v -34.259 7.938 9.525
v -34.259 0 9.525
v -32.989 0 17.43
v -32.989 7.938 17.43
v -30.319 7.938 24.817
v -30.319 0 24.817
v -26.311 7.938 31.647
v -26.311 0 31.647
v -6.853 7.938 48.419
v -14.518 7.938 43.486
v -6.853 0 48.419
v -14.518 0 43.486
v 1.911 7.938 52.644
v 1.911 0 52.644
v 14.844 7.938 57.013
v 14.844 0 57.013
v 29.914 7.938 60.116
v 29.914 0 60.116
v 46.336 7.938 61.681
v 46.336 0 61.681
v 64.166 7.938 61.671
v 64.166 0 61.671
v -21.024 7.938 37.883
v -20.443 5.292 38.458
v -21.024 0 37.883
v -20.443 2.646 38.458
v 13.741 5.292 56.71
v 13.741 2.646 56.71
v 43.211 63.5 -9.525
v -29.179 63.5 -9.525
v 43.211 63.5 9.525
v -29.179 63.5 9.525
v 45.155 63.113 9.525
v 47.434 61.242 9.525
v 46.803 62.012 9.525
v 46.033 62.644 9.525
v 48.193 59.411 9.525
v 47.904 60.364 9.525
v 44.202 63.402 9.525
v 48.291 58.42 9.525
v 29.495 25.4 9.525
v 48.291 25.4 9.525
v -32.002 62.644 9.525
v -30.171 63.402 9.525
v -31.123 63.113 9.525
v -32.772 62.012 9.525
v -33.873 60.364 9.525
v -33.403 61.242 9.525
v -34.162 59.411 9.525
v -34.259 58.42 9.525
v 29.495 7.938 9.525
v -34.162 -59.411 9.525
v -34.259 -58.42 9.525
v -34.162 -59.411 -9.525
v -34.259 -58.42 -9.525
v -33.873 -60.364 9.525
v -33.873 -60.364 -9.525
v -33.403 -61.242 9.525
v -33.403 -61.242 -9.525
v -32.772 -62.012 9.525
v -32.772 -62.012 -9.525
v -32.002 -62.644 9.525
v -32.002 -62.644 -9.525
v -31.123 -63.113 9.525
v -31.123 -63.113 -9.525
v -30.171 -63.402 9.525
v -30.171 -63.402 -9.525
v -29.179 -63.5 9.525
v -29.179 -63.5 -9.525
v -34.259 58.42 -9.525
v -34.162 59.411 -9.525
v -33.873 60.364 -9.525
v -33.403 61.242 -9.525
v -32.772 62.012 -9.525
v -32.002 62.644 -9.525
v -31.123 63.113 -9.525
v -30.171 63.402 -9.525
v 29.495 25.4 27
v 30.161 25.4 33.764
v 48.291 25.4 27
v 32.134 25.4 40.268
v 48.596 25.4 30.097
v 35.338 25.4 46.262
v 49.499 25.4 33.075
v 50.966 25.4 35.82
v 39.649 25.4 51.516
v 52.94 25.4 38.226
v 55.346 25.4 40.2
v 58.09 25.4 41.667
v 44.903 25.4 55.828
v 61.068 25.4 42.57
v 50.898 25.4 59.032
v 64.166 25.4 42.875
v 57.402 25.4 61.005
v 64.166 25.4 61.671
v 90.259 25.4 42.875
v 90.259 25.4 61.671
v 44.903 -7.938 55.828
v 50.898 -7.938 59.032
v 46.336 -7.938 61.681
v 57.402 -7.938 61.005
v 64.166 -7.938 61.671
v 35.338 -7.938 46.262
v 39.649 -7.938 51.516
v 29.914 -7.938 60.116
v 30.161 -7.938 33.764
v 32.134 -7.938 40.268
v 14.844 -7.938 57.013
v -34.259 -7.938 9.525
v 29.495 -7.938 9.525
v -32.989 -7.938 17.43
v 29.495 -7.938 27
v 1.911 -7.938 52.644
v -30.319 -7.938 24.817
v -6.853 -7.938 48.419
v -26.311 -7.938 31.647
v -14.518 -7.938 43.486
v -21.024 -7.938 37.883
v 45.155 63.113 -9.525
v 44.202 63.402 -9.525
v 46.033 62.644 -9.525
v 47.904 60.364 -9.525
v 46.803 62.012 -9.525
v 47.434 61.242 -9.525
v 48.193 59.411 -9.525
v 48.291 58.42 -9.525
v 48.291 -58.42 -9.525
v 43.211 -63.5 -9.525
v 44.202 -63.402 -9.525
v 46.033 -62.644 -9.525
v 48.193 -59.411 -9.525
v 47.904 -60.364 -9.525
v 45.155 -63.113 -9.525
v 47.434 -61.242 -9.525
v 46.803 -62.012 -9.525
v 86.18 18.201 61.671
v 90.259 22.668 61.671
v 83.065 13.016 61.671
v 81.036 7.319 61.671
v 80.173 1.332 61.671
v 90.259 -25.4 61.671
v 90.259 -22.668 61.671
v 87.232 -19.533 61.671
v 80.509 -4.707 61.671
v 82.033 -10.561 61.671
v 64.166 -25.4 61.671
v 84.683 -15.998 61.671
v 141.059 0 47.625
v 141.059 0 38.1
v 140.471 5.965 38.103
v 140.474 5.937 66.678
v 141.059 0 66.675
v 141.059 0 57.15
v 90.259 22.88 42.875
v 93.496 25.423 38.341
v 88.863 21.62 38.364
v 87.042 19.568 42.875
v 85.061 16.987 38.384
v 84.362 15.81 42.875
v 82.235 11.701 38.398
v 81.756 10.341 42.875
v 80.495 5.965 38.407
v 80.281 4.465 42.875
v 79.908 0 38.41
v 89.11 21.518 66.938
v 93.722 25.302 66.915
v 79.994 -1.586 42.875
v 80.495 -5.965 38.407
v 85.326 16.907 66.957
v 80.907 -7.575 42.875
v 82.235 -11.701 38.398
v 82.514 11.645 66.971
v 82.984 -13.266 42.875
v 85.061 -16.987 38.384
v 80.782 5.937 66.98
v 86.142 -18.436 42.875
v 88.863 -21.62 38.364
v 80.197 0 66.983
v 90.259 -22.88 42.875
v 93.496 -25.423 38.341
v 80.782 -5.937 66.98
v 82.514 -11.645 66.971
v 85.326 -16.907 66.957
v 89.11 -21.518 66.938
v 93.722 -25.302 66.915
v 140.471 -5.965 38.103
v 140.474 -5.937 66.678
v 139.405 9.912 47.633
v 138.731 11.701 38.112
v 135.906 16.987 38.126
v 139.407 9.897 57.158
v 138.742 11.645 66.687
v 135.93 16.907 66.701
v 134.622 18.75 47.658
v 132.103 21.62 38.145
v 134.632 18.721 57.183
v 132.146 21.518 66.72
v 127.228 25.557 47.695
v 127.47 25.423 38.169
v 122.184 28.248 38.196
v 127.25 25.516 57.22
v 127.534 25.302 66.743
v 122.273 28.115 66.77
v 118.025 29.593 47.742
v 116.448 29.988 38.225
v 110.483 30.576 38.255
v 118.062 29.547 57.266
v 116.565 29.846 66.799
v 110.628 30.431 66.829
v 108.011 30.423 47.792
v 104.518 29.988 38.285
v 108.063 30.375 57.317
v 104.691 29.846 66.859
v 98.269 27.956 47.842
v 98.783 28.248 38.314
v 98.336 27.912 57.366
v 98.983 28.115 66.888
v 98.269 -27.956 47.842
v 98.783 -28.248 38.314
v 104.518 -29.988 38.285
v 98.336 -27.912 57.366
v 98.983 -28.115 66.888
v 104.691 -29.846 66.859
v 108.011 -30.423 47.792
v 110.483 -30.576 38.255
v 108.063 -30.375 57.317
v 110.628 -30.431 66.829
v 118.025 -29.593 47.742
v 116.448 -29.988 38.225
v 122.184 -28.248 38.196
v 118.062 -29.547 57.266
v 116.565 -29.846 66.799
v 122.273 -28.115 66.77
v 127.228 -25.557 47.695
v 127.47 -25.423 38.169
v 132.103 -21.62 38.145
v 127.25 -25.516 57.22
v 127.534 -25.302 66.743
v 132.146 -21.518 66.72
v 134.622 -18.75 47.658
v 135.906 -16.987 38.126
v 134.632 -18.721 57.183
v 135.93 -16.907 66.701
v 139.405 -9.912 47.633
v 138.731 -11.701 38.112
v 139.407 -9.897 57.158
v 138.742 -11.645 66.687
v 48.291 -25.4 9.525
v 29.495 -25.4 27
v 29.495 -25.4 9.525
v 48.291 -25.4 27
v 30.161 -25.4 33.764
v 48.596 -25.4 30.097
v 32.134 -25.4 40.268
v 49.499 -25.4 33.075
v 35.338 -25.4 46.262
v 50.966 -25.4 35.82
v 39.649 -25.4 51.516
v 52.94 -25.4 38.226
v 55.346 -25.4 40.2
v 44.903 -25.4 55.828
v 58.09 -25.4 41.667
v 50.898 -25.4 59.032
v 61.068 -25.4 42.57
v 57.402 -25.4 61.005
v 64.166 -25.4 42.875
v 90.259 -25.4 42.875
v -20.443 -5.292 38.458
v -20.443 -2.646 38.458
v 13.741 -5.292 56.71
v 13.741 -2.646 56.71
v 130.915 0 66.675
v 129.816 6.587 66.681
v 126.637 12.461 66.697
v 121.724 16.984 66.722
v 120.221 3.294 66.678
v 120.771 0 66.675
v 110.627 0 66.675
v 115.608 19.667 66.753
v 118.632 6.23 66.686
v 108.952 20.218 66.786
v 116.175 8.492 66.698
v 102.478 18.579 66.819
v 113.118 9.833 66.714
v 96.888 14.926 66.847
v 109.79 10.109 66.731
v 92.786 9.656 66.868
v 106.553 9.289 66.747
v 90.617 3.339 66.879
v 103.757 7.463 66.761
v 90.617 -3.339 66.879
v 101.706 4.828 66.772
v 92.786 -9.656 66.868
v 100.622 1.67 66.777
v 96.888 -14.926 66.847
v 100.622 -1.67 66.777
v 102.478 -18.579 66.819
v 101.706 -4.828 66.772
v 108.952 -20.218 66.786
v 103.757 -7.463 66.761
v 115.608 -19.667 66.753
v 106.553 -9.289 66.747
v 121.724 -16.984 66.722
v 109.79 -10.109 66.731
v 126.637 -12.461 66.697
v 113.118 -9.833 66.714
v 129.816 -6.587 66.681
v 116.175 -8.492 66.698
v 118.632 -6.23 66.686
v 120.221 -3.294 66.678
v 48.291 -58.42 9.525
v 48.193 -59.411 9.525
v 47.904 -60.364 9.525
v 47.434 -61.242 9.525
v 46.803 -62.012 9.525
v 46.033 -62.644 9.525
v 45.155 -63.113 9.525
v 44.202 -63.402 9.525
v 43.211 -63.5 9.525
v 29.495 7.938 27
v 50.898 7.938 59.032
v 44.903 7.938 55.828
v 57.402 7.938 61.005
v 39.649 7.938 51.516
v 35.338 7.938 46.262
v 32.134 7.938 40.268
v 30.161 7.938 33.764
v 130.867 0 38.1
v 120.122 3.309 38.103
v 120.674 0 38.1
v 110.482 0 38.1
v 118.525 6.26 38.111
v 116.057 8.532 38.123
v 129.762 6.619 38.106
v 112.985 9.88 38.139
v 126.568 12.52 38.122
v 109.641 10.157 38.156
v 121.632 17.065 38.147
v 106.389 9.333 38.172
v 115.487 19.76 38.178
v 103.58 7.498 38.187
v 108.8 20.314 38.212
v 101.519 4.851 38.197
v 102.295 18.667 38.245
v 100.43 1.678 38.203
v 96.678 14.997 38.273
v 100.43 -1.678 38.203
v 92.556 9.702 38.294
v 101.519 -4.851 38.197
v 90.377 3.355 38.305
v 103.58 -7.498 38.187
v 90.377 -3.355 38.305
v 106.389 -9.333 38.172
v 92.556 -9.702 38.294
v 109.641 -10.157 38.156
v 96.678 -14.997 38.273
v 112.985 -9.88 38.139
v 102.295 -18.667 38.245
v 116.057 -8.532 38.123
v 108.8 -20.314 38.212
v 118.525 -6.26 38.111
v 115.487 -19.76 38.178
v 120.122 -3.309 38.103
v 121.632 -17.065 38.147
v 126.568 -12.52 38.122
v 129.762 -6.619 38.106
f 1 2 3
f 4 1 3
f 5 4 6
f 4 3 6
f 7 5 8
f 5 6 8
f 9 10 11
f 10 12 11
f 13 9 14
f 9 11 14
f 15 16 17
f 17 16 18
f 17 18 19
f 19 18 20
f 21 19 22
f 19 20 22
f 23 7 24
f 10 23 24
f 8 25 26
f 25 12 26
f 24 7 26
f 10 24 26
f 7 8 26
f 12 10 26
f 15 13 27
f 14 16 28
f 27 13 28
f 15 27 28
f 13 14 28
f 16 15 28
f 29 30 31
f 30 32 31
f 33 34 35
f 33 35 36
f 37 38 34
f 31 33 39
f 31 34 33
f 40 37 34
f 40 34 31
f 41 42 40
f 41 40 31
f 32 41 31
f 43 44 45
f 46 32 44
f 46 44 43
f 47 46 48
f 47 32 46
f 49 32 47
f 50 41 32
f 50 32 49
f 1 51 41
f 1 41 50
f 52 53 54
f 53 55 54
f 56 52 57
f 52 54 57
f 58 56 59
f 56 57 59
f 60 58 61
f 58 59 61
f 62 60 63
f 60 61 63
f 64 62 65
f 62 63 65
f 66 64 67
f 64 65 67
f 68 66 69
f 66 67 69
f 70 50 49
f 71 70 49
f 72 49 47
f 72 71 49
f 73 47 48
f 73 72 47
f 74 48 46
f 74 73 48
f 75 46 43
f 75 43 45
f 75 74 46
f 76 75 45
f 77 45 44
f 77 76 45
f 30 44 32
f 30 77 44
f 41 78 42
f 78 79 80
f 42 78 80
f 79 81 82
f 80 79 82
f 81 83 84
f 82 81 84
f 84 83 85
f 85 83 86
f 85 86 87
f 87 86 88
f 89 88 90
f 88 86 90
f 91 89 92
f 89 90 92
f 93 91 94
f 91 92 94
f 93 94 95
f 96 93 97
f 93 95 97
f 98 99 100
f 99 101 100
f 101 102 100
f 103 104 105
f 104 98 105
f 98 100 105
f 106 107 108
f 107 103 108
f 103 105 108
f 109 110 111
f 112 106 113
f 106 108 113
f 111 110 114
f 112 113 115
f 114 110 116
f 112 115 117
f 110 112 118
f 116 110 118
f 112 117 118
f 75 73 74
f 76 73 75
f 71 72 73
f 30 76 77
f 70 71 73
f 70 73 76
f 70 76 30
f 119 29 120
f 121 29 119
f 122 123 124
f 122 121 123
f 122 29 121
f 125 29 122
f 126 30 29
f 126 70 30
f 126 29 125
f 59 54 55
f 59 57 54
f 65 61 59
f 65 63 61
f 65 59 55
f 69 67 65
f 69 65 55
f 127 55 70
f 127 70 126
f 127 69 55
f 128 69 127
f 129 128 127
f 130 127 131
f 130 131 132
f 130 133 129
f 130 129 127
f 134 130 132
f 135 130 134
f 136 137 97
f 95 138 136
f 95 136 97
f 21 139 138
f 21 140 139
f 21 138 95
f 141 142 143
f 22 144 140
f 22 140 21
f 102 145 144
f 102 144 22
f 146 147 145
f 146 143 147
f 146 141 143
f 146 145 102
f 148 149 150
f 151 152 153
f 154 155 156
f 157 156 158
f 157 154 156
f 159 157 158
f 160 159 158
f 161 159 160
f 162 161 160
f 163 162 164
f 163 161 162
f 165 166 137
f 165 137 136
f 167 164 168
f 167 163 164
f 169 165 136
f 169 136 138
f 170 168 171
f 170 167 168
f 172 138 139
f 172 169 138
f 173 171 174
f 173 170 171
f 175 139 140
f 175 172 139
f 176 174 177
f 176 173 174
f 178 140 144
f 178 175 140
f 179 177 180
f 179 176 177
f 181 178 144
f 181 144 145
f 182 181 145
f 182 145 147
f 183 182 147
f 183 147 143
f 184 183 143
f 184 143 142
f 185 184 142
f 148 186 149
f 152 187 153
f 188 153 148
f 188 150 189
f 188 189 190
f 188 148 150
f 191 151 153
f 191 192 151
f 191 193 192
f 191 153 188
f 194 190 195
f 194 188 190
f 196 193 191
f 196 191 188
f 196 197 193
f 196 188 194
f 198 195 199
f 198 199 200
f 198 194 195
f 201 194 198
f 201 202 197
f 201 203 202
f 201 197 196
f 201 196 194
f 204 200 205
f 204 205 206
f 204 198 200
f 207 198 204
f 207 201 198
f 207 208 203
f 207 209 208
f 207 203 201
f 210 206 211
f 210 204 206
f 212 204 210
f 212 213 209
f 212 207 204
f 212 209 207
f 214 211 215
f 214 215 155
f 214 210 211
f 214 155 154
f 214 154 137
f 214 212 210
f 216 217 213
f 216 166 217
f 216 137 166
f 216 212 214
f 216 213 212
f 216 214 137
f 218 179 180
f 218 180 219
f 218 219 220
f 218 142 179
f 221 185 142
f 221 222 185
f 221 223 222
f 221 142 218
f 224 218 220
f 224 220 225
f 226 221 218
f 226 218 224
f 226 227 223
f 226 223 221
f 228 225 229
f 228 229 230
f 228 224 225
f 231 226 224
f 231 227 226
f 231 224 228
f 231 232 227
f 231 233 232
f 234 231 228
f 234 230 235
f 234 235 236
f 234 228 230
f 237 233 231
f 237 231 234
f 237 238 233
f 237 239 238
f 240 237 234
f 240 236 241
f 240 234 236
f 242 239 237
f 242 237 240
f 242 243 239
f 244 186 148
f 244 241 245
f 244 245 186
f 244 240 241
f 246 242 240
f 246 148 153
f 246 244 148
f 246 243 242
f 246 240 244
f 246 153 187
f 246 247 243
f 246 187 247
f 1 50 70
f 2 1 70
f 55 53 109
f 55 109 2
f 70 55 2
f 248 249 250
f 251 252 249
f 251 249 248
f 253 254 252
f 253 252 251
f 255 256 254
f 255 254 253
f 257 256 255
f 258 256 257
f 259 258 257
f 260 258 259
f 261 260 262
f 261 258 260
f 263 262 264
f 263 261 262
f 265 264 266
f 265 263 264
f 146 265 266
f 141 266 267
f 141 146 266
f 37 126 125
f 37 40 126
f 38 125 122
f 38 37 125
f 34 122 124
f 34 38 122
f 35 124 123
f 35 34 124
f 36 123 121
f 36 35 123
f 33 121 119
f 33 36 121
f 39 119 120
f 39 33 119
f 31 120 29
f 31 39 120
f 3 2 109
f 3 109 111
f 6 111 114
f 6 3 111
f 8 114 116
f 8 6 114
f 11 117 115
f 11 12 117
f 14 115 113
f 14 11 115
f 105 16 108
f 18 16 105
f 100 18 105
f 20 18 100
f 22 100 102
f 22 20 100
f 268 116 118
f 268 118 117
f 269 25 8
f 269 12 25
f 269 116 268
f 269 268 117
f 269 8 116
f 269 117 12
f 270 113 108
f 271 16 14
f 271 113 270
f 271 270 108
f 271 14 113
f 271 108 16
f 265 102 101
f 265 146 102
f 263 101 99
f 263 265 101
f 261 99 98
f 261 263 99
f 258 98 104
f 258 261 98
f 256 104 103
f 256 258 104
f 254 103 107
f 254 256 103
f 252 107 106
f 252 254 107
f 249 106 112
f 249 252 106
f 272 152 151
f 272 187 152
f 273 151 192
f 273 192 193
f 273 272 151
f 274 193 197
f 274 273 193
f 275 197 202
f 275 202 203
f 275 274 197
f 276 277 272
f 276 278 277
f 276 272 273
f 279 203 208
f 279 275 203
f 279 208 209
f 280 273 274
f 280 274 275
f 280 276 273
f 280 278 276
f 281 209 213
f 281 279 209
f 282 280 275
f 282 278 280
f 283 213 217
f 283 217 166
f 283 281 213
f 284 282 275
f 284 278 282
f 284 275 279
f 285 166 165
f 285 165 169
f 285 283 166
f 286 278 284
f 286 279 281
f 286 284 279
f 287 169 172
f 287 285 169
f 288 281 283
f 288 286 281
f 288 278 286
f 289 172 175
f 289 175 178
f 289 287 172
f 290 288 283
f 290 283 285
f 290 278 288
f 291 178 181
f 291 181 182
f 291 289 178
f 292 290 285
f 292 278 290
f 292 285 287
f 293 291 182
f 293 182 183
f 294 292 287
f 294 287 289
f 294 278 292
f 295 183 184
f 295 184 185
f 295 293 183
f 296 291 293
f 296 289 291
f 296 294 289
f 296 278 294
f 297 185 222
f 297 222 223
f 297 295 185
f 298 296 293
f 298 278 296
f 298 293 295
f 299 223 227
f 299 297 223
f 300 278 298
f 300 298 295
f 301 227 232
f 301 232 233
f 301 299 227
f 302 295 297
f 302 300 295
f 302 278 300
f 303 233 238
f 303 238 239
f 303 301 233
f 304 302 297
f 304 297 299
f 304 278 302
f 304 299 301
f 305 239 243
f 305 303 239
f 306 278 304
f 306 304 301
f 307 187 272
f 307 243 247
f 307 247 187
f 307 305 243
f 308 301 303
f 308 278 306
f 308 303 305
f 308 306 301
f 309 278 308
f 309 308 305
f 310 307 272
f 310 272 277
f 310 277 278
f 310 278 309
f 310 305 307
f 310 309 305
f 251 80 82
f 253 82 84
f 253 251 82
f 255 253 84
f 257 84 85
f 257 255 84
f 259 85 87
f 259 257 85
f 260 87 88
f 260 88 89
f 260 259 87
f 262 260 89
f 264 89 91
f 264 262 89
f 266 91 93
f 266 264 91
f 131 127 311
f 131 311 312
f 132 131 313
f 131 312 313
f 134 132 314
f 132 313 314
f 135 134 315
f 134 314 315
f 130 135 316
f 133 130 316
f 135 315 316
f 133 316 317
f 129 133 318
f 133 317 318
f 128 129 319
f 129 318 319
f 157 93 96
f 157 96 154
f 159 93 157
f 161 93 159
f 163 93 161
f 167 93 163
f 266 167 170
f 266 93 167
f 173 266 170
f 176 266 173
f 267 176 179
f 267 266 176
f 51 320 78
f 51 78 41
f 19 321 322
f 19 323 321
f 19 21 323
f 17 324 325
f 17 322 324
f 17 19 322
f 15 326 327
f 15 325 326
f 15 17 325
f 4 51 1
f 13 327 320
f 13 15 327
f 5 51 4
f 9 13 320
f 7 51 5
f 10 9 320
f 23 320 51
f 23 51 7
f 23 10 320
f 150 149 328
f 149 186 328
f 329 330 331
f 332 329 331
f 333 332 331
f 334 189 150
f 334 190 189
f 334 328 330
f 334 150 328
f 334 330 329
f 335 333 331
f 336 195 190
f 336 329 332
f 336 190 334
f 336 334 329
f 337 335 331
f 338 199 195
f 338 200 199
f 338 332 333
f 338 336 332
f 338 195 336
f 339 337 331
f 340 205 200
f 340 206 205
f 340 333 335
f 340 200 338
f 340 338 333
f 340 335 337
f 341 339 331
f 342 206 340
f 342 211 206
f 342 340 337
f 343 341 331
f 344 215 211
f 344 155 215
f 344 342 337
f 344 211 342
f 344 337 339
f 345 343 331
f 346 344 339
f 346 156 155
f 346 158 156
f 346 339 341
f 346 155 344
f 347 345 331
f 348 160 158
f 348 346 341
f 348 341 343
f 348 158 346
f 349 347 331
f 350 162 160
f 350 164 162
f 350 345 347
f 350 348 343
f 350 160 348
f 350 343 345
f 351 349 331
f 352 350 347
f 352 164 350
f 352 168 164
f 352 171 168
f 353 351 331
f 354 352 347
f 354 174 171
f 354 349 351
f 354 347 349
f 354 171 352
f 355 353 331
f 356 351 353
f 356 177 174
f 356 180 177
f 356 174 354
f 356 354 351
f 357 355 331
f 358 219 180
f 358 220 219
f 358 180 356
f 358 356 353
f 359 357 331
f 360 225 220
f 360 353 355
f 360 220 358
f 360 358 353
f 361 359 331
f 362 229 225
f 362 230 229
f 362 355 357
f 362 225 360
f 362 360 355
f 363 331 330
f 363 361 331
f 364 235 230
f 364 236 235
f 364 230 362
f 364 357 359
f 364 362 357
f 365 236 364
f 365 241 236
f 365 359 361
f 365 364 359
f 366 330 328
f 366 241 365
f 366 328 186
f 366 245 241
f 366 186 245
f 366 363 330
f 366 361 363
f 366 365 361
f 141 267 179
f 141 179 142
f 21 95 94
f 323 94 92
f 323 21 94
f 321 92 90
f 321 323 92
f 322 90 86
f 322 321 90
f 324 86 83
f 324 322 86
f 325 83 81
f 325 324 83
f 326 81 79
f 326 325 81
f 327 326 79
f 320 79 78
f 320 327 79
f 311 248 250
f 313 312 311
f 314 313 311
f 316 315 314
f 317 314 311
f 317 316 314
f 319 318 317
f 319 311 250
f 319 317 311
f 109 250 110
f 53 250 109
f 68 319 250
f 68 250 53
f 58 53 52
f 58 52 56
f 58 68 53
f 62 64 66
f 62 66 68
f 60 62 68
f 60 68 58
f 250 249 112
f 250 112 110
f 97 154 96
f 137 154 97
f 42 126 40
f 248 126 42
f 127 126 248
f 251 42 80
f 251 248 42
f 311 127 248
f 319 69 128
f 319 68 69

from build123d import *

# Parameters (mm, degrees)
F1_DEPTH = 63.5
F2_DEPTH = 25.4
F3_DEPTH = 7.9375
F5_R     = 5.08


with BuildPart() as f1:
    # F0 (on Front) → F1 (new body, symmetric)
    with BuildSketch(Plane.XZ):
        Polygon((29.4945527817, 9.525), (-34.2594462869, 9.525), (-34.2594462869, -9.525), (48.2905537131, -9.525), (48.2905537131, 9.525), align=None)
    extrude(amount=F1_DEPTH, both=True)

    # F0 (on Front) → F2 (join, symmetric)
    with BuildSketch(Plane.XZ):
        with BuildLine():
            Line((29.4945527817, 27.0002), (29.4945527817, 9.525))
            Line((29.4945527817, 9.525), (48.2905537131, 9.525))
            Line((48.2905537131, 9.525), (48.2905537131, 27.0002))
            ThreePointArc((48.2905537131, 27.0002), (52.9402335618, 38.2255201513), (64.1655537131, 42.8752))
            Line((64.1655537131, 42.8752), (90.2585908771, 42.8752))
            Line((90.2585908771, 42.8752), (90.2585908771, 61.6712009314))
            Line((90.2585908771, 61.6712009314), (64.1655537131, 61.6712009314))
            ThreePointArc((64.1655537131, 61.6712009314), (39.649453844, 51.5162998691), (29.4945527817, 27.0002))
        make_face()
    extrude(amount=F2_DEPTH, both=True)

    # F0 (on Front) → F3 (join, symmetric)
    with BuildSketch(Plane.XZ):
        with BuildLine():
            add(Edge.make_bspline(
                [(-34.2594462869, 9.525), (-32.0006241091, 42.9277569056), (6.9947489537, 64.2252266407), (64.1655537131, 61.6712009314)],
                knots=[0, 0, 0, 0, 111.3853980402, 111.3853980402, 111.3853980402, 111.3853980402], degree=3))
            Line((-34.2594462869, 9.525), (29.4945527817, 9.525))
            Line((29.4945527817, 9.525), (29.4945527817, 27.0002))
            ThreePointArc((29.4945527817, 27.0002), (39.649453844, 51.5162998691), (64.1655537131, 61.6712009314))
        make_face()
    extrude(amount=F3_DEPTH, both=True)

    # F0 (on Front) → F4 (revolve)
    with BuildSketch(Plane.XZ):
        Polygon((110.6271635748, 66.675), (110.6018233776, 61.6712009314), (110.4824542999, 38.1), (141.0585908771, 38.1), (141.0585908771, 66.675), align=None)
    revolve(axis=Axis((110.5548089374, 0, 52.3875), (0.0050641267, 0, 0.9999871772)))

    # F5
    f5_edges = [f1.edges().sort_by_distance(p)[0] for p in [
        (48.290554, 63.5, 0),
        (48.290554, -63.5, 0),
        (-34.259446, -63.5, 0),
        (-34.259446, 63.5, 0),
    ]]
    fillet(f5_edges, radius=F5_R)


solid = f1.part
